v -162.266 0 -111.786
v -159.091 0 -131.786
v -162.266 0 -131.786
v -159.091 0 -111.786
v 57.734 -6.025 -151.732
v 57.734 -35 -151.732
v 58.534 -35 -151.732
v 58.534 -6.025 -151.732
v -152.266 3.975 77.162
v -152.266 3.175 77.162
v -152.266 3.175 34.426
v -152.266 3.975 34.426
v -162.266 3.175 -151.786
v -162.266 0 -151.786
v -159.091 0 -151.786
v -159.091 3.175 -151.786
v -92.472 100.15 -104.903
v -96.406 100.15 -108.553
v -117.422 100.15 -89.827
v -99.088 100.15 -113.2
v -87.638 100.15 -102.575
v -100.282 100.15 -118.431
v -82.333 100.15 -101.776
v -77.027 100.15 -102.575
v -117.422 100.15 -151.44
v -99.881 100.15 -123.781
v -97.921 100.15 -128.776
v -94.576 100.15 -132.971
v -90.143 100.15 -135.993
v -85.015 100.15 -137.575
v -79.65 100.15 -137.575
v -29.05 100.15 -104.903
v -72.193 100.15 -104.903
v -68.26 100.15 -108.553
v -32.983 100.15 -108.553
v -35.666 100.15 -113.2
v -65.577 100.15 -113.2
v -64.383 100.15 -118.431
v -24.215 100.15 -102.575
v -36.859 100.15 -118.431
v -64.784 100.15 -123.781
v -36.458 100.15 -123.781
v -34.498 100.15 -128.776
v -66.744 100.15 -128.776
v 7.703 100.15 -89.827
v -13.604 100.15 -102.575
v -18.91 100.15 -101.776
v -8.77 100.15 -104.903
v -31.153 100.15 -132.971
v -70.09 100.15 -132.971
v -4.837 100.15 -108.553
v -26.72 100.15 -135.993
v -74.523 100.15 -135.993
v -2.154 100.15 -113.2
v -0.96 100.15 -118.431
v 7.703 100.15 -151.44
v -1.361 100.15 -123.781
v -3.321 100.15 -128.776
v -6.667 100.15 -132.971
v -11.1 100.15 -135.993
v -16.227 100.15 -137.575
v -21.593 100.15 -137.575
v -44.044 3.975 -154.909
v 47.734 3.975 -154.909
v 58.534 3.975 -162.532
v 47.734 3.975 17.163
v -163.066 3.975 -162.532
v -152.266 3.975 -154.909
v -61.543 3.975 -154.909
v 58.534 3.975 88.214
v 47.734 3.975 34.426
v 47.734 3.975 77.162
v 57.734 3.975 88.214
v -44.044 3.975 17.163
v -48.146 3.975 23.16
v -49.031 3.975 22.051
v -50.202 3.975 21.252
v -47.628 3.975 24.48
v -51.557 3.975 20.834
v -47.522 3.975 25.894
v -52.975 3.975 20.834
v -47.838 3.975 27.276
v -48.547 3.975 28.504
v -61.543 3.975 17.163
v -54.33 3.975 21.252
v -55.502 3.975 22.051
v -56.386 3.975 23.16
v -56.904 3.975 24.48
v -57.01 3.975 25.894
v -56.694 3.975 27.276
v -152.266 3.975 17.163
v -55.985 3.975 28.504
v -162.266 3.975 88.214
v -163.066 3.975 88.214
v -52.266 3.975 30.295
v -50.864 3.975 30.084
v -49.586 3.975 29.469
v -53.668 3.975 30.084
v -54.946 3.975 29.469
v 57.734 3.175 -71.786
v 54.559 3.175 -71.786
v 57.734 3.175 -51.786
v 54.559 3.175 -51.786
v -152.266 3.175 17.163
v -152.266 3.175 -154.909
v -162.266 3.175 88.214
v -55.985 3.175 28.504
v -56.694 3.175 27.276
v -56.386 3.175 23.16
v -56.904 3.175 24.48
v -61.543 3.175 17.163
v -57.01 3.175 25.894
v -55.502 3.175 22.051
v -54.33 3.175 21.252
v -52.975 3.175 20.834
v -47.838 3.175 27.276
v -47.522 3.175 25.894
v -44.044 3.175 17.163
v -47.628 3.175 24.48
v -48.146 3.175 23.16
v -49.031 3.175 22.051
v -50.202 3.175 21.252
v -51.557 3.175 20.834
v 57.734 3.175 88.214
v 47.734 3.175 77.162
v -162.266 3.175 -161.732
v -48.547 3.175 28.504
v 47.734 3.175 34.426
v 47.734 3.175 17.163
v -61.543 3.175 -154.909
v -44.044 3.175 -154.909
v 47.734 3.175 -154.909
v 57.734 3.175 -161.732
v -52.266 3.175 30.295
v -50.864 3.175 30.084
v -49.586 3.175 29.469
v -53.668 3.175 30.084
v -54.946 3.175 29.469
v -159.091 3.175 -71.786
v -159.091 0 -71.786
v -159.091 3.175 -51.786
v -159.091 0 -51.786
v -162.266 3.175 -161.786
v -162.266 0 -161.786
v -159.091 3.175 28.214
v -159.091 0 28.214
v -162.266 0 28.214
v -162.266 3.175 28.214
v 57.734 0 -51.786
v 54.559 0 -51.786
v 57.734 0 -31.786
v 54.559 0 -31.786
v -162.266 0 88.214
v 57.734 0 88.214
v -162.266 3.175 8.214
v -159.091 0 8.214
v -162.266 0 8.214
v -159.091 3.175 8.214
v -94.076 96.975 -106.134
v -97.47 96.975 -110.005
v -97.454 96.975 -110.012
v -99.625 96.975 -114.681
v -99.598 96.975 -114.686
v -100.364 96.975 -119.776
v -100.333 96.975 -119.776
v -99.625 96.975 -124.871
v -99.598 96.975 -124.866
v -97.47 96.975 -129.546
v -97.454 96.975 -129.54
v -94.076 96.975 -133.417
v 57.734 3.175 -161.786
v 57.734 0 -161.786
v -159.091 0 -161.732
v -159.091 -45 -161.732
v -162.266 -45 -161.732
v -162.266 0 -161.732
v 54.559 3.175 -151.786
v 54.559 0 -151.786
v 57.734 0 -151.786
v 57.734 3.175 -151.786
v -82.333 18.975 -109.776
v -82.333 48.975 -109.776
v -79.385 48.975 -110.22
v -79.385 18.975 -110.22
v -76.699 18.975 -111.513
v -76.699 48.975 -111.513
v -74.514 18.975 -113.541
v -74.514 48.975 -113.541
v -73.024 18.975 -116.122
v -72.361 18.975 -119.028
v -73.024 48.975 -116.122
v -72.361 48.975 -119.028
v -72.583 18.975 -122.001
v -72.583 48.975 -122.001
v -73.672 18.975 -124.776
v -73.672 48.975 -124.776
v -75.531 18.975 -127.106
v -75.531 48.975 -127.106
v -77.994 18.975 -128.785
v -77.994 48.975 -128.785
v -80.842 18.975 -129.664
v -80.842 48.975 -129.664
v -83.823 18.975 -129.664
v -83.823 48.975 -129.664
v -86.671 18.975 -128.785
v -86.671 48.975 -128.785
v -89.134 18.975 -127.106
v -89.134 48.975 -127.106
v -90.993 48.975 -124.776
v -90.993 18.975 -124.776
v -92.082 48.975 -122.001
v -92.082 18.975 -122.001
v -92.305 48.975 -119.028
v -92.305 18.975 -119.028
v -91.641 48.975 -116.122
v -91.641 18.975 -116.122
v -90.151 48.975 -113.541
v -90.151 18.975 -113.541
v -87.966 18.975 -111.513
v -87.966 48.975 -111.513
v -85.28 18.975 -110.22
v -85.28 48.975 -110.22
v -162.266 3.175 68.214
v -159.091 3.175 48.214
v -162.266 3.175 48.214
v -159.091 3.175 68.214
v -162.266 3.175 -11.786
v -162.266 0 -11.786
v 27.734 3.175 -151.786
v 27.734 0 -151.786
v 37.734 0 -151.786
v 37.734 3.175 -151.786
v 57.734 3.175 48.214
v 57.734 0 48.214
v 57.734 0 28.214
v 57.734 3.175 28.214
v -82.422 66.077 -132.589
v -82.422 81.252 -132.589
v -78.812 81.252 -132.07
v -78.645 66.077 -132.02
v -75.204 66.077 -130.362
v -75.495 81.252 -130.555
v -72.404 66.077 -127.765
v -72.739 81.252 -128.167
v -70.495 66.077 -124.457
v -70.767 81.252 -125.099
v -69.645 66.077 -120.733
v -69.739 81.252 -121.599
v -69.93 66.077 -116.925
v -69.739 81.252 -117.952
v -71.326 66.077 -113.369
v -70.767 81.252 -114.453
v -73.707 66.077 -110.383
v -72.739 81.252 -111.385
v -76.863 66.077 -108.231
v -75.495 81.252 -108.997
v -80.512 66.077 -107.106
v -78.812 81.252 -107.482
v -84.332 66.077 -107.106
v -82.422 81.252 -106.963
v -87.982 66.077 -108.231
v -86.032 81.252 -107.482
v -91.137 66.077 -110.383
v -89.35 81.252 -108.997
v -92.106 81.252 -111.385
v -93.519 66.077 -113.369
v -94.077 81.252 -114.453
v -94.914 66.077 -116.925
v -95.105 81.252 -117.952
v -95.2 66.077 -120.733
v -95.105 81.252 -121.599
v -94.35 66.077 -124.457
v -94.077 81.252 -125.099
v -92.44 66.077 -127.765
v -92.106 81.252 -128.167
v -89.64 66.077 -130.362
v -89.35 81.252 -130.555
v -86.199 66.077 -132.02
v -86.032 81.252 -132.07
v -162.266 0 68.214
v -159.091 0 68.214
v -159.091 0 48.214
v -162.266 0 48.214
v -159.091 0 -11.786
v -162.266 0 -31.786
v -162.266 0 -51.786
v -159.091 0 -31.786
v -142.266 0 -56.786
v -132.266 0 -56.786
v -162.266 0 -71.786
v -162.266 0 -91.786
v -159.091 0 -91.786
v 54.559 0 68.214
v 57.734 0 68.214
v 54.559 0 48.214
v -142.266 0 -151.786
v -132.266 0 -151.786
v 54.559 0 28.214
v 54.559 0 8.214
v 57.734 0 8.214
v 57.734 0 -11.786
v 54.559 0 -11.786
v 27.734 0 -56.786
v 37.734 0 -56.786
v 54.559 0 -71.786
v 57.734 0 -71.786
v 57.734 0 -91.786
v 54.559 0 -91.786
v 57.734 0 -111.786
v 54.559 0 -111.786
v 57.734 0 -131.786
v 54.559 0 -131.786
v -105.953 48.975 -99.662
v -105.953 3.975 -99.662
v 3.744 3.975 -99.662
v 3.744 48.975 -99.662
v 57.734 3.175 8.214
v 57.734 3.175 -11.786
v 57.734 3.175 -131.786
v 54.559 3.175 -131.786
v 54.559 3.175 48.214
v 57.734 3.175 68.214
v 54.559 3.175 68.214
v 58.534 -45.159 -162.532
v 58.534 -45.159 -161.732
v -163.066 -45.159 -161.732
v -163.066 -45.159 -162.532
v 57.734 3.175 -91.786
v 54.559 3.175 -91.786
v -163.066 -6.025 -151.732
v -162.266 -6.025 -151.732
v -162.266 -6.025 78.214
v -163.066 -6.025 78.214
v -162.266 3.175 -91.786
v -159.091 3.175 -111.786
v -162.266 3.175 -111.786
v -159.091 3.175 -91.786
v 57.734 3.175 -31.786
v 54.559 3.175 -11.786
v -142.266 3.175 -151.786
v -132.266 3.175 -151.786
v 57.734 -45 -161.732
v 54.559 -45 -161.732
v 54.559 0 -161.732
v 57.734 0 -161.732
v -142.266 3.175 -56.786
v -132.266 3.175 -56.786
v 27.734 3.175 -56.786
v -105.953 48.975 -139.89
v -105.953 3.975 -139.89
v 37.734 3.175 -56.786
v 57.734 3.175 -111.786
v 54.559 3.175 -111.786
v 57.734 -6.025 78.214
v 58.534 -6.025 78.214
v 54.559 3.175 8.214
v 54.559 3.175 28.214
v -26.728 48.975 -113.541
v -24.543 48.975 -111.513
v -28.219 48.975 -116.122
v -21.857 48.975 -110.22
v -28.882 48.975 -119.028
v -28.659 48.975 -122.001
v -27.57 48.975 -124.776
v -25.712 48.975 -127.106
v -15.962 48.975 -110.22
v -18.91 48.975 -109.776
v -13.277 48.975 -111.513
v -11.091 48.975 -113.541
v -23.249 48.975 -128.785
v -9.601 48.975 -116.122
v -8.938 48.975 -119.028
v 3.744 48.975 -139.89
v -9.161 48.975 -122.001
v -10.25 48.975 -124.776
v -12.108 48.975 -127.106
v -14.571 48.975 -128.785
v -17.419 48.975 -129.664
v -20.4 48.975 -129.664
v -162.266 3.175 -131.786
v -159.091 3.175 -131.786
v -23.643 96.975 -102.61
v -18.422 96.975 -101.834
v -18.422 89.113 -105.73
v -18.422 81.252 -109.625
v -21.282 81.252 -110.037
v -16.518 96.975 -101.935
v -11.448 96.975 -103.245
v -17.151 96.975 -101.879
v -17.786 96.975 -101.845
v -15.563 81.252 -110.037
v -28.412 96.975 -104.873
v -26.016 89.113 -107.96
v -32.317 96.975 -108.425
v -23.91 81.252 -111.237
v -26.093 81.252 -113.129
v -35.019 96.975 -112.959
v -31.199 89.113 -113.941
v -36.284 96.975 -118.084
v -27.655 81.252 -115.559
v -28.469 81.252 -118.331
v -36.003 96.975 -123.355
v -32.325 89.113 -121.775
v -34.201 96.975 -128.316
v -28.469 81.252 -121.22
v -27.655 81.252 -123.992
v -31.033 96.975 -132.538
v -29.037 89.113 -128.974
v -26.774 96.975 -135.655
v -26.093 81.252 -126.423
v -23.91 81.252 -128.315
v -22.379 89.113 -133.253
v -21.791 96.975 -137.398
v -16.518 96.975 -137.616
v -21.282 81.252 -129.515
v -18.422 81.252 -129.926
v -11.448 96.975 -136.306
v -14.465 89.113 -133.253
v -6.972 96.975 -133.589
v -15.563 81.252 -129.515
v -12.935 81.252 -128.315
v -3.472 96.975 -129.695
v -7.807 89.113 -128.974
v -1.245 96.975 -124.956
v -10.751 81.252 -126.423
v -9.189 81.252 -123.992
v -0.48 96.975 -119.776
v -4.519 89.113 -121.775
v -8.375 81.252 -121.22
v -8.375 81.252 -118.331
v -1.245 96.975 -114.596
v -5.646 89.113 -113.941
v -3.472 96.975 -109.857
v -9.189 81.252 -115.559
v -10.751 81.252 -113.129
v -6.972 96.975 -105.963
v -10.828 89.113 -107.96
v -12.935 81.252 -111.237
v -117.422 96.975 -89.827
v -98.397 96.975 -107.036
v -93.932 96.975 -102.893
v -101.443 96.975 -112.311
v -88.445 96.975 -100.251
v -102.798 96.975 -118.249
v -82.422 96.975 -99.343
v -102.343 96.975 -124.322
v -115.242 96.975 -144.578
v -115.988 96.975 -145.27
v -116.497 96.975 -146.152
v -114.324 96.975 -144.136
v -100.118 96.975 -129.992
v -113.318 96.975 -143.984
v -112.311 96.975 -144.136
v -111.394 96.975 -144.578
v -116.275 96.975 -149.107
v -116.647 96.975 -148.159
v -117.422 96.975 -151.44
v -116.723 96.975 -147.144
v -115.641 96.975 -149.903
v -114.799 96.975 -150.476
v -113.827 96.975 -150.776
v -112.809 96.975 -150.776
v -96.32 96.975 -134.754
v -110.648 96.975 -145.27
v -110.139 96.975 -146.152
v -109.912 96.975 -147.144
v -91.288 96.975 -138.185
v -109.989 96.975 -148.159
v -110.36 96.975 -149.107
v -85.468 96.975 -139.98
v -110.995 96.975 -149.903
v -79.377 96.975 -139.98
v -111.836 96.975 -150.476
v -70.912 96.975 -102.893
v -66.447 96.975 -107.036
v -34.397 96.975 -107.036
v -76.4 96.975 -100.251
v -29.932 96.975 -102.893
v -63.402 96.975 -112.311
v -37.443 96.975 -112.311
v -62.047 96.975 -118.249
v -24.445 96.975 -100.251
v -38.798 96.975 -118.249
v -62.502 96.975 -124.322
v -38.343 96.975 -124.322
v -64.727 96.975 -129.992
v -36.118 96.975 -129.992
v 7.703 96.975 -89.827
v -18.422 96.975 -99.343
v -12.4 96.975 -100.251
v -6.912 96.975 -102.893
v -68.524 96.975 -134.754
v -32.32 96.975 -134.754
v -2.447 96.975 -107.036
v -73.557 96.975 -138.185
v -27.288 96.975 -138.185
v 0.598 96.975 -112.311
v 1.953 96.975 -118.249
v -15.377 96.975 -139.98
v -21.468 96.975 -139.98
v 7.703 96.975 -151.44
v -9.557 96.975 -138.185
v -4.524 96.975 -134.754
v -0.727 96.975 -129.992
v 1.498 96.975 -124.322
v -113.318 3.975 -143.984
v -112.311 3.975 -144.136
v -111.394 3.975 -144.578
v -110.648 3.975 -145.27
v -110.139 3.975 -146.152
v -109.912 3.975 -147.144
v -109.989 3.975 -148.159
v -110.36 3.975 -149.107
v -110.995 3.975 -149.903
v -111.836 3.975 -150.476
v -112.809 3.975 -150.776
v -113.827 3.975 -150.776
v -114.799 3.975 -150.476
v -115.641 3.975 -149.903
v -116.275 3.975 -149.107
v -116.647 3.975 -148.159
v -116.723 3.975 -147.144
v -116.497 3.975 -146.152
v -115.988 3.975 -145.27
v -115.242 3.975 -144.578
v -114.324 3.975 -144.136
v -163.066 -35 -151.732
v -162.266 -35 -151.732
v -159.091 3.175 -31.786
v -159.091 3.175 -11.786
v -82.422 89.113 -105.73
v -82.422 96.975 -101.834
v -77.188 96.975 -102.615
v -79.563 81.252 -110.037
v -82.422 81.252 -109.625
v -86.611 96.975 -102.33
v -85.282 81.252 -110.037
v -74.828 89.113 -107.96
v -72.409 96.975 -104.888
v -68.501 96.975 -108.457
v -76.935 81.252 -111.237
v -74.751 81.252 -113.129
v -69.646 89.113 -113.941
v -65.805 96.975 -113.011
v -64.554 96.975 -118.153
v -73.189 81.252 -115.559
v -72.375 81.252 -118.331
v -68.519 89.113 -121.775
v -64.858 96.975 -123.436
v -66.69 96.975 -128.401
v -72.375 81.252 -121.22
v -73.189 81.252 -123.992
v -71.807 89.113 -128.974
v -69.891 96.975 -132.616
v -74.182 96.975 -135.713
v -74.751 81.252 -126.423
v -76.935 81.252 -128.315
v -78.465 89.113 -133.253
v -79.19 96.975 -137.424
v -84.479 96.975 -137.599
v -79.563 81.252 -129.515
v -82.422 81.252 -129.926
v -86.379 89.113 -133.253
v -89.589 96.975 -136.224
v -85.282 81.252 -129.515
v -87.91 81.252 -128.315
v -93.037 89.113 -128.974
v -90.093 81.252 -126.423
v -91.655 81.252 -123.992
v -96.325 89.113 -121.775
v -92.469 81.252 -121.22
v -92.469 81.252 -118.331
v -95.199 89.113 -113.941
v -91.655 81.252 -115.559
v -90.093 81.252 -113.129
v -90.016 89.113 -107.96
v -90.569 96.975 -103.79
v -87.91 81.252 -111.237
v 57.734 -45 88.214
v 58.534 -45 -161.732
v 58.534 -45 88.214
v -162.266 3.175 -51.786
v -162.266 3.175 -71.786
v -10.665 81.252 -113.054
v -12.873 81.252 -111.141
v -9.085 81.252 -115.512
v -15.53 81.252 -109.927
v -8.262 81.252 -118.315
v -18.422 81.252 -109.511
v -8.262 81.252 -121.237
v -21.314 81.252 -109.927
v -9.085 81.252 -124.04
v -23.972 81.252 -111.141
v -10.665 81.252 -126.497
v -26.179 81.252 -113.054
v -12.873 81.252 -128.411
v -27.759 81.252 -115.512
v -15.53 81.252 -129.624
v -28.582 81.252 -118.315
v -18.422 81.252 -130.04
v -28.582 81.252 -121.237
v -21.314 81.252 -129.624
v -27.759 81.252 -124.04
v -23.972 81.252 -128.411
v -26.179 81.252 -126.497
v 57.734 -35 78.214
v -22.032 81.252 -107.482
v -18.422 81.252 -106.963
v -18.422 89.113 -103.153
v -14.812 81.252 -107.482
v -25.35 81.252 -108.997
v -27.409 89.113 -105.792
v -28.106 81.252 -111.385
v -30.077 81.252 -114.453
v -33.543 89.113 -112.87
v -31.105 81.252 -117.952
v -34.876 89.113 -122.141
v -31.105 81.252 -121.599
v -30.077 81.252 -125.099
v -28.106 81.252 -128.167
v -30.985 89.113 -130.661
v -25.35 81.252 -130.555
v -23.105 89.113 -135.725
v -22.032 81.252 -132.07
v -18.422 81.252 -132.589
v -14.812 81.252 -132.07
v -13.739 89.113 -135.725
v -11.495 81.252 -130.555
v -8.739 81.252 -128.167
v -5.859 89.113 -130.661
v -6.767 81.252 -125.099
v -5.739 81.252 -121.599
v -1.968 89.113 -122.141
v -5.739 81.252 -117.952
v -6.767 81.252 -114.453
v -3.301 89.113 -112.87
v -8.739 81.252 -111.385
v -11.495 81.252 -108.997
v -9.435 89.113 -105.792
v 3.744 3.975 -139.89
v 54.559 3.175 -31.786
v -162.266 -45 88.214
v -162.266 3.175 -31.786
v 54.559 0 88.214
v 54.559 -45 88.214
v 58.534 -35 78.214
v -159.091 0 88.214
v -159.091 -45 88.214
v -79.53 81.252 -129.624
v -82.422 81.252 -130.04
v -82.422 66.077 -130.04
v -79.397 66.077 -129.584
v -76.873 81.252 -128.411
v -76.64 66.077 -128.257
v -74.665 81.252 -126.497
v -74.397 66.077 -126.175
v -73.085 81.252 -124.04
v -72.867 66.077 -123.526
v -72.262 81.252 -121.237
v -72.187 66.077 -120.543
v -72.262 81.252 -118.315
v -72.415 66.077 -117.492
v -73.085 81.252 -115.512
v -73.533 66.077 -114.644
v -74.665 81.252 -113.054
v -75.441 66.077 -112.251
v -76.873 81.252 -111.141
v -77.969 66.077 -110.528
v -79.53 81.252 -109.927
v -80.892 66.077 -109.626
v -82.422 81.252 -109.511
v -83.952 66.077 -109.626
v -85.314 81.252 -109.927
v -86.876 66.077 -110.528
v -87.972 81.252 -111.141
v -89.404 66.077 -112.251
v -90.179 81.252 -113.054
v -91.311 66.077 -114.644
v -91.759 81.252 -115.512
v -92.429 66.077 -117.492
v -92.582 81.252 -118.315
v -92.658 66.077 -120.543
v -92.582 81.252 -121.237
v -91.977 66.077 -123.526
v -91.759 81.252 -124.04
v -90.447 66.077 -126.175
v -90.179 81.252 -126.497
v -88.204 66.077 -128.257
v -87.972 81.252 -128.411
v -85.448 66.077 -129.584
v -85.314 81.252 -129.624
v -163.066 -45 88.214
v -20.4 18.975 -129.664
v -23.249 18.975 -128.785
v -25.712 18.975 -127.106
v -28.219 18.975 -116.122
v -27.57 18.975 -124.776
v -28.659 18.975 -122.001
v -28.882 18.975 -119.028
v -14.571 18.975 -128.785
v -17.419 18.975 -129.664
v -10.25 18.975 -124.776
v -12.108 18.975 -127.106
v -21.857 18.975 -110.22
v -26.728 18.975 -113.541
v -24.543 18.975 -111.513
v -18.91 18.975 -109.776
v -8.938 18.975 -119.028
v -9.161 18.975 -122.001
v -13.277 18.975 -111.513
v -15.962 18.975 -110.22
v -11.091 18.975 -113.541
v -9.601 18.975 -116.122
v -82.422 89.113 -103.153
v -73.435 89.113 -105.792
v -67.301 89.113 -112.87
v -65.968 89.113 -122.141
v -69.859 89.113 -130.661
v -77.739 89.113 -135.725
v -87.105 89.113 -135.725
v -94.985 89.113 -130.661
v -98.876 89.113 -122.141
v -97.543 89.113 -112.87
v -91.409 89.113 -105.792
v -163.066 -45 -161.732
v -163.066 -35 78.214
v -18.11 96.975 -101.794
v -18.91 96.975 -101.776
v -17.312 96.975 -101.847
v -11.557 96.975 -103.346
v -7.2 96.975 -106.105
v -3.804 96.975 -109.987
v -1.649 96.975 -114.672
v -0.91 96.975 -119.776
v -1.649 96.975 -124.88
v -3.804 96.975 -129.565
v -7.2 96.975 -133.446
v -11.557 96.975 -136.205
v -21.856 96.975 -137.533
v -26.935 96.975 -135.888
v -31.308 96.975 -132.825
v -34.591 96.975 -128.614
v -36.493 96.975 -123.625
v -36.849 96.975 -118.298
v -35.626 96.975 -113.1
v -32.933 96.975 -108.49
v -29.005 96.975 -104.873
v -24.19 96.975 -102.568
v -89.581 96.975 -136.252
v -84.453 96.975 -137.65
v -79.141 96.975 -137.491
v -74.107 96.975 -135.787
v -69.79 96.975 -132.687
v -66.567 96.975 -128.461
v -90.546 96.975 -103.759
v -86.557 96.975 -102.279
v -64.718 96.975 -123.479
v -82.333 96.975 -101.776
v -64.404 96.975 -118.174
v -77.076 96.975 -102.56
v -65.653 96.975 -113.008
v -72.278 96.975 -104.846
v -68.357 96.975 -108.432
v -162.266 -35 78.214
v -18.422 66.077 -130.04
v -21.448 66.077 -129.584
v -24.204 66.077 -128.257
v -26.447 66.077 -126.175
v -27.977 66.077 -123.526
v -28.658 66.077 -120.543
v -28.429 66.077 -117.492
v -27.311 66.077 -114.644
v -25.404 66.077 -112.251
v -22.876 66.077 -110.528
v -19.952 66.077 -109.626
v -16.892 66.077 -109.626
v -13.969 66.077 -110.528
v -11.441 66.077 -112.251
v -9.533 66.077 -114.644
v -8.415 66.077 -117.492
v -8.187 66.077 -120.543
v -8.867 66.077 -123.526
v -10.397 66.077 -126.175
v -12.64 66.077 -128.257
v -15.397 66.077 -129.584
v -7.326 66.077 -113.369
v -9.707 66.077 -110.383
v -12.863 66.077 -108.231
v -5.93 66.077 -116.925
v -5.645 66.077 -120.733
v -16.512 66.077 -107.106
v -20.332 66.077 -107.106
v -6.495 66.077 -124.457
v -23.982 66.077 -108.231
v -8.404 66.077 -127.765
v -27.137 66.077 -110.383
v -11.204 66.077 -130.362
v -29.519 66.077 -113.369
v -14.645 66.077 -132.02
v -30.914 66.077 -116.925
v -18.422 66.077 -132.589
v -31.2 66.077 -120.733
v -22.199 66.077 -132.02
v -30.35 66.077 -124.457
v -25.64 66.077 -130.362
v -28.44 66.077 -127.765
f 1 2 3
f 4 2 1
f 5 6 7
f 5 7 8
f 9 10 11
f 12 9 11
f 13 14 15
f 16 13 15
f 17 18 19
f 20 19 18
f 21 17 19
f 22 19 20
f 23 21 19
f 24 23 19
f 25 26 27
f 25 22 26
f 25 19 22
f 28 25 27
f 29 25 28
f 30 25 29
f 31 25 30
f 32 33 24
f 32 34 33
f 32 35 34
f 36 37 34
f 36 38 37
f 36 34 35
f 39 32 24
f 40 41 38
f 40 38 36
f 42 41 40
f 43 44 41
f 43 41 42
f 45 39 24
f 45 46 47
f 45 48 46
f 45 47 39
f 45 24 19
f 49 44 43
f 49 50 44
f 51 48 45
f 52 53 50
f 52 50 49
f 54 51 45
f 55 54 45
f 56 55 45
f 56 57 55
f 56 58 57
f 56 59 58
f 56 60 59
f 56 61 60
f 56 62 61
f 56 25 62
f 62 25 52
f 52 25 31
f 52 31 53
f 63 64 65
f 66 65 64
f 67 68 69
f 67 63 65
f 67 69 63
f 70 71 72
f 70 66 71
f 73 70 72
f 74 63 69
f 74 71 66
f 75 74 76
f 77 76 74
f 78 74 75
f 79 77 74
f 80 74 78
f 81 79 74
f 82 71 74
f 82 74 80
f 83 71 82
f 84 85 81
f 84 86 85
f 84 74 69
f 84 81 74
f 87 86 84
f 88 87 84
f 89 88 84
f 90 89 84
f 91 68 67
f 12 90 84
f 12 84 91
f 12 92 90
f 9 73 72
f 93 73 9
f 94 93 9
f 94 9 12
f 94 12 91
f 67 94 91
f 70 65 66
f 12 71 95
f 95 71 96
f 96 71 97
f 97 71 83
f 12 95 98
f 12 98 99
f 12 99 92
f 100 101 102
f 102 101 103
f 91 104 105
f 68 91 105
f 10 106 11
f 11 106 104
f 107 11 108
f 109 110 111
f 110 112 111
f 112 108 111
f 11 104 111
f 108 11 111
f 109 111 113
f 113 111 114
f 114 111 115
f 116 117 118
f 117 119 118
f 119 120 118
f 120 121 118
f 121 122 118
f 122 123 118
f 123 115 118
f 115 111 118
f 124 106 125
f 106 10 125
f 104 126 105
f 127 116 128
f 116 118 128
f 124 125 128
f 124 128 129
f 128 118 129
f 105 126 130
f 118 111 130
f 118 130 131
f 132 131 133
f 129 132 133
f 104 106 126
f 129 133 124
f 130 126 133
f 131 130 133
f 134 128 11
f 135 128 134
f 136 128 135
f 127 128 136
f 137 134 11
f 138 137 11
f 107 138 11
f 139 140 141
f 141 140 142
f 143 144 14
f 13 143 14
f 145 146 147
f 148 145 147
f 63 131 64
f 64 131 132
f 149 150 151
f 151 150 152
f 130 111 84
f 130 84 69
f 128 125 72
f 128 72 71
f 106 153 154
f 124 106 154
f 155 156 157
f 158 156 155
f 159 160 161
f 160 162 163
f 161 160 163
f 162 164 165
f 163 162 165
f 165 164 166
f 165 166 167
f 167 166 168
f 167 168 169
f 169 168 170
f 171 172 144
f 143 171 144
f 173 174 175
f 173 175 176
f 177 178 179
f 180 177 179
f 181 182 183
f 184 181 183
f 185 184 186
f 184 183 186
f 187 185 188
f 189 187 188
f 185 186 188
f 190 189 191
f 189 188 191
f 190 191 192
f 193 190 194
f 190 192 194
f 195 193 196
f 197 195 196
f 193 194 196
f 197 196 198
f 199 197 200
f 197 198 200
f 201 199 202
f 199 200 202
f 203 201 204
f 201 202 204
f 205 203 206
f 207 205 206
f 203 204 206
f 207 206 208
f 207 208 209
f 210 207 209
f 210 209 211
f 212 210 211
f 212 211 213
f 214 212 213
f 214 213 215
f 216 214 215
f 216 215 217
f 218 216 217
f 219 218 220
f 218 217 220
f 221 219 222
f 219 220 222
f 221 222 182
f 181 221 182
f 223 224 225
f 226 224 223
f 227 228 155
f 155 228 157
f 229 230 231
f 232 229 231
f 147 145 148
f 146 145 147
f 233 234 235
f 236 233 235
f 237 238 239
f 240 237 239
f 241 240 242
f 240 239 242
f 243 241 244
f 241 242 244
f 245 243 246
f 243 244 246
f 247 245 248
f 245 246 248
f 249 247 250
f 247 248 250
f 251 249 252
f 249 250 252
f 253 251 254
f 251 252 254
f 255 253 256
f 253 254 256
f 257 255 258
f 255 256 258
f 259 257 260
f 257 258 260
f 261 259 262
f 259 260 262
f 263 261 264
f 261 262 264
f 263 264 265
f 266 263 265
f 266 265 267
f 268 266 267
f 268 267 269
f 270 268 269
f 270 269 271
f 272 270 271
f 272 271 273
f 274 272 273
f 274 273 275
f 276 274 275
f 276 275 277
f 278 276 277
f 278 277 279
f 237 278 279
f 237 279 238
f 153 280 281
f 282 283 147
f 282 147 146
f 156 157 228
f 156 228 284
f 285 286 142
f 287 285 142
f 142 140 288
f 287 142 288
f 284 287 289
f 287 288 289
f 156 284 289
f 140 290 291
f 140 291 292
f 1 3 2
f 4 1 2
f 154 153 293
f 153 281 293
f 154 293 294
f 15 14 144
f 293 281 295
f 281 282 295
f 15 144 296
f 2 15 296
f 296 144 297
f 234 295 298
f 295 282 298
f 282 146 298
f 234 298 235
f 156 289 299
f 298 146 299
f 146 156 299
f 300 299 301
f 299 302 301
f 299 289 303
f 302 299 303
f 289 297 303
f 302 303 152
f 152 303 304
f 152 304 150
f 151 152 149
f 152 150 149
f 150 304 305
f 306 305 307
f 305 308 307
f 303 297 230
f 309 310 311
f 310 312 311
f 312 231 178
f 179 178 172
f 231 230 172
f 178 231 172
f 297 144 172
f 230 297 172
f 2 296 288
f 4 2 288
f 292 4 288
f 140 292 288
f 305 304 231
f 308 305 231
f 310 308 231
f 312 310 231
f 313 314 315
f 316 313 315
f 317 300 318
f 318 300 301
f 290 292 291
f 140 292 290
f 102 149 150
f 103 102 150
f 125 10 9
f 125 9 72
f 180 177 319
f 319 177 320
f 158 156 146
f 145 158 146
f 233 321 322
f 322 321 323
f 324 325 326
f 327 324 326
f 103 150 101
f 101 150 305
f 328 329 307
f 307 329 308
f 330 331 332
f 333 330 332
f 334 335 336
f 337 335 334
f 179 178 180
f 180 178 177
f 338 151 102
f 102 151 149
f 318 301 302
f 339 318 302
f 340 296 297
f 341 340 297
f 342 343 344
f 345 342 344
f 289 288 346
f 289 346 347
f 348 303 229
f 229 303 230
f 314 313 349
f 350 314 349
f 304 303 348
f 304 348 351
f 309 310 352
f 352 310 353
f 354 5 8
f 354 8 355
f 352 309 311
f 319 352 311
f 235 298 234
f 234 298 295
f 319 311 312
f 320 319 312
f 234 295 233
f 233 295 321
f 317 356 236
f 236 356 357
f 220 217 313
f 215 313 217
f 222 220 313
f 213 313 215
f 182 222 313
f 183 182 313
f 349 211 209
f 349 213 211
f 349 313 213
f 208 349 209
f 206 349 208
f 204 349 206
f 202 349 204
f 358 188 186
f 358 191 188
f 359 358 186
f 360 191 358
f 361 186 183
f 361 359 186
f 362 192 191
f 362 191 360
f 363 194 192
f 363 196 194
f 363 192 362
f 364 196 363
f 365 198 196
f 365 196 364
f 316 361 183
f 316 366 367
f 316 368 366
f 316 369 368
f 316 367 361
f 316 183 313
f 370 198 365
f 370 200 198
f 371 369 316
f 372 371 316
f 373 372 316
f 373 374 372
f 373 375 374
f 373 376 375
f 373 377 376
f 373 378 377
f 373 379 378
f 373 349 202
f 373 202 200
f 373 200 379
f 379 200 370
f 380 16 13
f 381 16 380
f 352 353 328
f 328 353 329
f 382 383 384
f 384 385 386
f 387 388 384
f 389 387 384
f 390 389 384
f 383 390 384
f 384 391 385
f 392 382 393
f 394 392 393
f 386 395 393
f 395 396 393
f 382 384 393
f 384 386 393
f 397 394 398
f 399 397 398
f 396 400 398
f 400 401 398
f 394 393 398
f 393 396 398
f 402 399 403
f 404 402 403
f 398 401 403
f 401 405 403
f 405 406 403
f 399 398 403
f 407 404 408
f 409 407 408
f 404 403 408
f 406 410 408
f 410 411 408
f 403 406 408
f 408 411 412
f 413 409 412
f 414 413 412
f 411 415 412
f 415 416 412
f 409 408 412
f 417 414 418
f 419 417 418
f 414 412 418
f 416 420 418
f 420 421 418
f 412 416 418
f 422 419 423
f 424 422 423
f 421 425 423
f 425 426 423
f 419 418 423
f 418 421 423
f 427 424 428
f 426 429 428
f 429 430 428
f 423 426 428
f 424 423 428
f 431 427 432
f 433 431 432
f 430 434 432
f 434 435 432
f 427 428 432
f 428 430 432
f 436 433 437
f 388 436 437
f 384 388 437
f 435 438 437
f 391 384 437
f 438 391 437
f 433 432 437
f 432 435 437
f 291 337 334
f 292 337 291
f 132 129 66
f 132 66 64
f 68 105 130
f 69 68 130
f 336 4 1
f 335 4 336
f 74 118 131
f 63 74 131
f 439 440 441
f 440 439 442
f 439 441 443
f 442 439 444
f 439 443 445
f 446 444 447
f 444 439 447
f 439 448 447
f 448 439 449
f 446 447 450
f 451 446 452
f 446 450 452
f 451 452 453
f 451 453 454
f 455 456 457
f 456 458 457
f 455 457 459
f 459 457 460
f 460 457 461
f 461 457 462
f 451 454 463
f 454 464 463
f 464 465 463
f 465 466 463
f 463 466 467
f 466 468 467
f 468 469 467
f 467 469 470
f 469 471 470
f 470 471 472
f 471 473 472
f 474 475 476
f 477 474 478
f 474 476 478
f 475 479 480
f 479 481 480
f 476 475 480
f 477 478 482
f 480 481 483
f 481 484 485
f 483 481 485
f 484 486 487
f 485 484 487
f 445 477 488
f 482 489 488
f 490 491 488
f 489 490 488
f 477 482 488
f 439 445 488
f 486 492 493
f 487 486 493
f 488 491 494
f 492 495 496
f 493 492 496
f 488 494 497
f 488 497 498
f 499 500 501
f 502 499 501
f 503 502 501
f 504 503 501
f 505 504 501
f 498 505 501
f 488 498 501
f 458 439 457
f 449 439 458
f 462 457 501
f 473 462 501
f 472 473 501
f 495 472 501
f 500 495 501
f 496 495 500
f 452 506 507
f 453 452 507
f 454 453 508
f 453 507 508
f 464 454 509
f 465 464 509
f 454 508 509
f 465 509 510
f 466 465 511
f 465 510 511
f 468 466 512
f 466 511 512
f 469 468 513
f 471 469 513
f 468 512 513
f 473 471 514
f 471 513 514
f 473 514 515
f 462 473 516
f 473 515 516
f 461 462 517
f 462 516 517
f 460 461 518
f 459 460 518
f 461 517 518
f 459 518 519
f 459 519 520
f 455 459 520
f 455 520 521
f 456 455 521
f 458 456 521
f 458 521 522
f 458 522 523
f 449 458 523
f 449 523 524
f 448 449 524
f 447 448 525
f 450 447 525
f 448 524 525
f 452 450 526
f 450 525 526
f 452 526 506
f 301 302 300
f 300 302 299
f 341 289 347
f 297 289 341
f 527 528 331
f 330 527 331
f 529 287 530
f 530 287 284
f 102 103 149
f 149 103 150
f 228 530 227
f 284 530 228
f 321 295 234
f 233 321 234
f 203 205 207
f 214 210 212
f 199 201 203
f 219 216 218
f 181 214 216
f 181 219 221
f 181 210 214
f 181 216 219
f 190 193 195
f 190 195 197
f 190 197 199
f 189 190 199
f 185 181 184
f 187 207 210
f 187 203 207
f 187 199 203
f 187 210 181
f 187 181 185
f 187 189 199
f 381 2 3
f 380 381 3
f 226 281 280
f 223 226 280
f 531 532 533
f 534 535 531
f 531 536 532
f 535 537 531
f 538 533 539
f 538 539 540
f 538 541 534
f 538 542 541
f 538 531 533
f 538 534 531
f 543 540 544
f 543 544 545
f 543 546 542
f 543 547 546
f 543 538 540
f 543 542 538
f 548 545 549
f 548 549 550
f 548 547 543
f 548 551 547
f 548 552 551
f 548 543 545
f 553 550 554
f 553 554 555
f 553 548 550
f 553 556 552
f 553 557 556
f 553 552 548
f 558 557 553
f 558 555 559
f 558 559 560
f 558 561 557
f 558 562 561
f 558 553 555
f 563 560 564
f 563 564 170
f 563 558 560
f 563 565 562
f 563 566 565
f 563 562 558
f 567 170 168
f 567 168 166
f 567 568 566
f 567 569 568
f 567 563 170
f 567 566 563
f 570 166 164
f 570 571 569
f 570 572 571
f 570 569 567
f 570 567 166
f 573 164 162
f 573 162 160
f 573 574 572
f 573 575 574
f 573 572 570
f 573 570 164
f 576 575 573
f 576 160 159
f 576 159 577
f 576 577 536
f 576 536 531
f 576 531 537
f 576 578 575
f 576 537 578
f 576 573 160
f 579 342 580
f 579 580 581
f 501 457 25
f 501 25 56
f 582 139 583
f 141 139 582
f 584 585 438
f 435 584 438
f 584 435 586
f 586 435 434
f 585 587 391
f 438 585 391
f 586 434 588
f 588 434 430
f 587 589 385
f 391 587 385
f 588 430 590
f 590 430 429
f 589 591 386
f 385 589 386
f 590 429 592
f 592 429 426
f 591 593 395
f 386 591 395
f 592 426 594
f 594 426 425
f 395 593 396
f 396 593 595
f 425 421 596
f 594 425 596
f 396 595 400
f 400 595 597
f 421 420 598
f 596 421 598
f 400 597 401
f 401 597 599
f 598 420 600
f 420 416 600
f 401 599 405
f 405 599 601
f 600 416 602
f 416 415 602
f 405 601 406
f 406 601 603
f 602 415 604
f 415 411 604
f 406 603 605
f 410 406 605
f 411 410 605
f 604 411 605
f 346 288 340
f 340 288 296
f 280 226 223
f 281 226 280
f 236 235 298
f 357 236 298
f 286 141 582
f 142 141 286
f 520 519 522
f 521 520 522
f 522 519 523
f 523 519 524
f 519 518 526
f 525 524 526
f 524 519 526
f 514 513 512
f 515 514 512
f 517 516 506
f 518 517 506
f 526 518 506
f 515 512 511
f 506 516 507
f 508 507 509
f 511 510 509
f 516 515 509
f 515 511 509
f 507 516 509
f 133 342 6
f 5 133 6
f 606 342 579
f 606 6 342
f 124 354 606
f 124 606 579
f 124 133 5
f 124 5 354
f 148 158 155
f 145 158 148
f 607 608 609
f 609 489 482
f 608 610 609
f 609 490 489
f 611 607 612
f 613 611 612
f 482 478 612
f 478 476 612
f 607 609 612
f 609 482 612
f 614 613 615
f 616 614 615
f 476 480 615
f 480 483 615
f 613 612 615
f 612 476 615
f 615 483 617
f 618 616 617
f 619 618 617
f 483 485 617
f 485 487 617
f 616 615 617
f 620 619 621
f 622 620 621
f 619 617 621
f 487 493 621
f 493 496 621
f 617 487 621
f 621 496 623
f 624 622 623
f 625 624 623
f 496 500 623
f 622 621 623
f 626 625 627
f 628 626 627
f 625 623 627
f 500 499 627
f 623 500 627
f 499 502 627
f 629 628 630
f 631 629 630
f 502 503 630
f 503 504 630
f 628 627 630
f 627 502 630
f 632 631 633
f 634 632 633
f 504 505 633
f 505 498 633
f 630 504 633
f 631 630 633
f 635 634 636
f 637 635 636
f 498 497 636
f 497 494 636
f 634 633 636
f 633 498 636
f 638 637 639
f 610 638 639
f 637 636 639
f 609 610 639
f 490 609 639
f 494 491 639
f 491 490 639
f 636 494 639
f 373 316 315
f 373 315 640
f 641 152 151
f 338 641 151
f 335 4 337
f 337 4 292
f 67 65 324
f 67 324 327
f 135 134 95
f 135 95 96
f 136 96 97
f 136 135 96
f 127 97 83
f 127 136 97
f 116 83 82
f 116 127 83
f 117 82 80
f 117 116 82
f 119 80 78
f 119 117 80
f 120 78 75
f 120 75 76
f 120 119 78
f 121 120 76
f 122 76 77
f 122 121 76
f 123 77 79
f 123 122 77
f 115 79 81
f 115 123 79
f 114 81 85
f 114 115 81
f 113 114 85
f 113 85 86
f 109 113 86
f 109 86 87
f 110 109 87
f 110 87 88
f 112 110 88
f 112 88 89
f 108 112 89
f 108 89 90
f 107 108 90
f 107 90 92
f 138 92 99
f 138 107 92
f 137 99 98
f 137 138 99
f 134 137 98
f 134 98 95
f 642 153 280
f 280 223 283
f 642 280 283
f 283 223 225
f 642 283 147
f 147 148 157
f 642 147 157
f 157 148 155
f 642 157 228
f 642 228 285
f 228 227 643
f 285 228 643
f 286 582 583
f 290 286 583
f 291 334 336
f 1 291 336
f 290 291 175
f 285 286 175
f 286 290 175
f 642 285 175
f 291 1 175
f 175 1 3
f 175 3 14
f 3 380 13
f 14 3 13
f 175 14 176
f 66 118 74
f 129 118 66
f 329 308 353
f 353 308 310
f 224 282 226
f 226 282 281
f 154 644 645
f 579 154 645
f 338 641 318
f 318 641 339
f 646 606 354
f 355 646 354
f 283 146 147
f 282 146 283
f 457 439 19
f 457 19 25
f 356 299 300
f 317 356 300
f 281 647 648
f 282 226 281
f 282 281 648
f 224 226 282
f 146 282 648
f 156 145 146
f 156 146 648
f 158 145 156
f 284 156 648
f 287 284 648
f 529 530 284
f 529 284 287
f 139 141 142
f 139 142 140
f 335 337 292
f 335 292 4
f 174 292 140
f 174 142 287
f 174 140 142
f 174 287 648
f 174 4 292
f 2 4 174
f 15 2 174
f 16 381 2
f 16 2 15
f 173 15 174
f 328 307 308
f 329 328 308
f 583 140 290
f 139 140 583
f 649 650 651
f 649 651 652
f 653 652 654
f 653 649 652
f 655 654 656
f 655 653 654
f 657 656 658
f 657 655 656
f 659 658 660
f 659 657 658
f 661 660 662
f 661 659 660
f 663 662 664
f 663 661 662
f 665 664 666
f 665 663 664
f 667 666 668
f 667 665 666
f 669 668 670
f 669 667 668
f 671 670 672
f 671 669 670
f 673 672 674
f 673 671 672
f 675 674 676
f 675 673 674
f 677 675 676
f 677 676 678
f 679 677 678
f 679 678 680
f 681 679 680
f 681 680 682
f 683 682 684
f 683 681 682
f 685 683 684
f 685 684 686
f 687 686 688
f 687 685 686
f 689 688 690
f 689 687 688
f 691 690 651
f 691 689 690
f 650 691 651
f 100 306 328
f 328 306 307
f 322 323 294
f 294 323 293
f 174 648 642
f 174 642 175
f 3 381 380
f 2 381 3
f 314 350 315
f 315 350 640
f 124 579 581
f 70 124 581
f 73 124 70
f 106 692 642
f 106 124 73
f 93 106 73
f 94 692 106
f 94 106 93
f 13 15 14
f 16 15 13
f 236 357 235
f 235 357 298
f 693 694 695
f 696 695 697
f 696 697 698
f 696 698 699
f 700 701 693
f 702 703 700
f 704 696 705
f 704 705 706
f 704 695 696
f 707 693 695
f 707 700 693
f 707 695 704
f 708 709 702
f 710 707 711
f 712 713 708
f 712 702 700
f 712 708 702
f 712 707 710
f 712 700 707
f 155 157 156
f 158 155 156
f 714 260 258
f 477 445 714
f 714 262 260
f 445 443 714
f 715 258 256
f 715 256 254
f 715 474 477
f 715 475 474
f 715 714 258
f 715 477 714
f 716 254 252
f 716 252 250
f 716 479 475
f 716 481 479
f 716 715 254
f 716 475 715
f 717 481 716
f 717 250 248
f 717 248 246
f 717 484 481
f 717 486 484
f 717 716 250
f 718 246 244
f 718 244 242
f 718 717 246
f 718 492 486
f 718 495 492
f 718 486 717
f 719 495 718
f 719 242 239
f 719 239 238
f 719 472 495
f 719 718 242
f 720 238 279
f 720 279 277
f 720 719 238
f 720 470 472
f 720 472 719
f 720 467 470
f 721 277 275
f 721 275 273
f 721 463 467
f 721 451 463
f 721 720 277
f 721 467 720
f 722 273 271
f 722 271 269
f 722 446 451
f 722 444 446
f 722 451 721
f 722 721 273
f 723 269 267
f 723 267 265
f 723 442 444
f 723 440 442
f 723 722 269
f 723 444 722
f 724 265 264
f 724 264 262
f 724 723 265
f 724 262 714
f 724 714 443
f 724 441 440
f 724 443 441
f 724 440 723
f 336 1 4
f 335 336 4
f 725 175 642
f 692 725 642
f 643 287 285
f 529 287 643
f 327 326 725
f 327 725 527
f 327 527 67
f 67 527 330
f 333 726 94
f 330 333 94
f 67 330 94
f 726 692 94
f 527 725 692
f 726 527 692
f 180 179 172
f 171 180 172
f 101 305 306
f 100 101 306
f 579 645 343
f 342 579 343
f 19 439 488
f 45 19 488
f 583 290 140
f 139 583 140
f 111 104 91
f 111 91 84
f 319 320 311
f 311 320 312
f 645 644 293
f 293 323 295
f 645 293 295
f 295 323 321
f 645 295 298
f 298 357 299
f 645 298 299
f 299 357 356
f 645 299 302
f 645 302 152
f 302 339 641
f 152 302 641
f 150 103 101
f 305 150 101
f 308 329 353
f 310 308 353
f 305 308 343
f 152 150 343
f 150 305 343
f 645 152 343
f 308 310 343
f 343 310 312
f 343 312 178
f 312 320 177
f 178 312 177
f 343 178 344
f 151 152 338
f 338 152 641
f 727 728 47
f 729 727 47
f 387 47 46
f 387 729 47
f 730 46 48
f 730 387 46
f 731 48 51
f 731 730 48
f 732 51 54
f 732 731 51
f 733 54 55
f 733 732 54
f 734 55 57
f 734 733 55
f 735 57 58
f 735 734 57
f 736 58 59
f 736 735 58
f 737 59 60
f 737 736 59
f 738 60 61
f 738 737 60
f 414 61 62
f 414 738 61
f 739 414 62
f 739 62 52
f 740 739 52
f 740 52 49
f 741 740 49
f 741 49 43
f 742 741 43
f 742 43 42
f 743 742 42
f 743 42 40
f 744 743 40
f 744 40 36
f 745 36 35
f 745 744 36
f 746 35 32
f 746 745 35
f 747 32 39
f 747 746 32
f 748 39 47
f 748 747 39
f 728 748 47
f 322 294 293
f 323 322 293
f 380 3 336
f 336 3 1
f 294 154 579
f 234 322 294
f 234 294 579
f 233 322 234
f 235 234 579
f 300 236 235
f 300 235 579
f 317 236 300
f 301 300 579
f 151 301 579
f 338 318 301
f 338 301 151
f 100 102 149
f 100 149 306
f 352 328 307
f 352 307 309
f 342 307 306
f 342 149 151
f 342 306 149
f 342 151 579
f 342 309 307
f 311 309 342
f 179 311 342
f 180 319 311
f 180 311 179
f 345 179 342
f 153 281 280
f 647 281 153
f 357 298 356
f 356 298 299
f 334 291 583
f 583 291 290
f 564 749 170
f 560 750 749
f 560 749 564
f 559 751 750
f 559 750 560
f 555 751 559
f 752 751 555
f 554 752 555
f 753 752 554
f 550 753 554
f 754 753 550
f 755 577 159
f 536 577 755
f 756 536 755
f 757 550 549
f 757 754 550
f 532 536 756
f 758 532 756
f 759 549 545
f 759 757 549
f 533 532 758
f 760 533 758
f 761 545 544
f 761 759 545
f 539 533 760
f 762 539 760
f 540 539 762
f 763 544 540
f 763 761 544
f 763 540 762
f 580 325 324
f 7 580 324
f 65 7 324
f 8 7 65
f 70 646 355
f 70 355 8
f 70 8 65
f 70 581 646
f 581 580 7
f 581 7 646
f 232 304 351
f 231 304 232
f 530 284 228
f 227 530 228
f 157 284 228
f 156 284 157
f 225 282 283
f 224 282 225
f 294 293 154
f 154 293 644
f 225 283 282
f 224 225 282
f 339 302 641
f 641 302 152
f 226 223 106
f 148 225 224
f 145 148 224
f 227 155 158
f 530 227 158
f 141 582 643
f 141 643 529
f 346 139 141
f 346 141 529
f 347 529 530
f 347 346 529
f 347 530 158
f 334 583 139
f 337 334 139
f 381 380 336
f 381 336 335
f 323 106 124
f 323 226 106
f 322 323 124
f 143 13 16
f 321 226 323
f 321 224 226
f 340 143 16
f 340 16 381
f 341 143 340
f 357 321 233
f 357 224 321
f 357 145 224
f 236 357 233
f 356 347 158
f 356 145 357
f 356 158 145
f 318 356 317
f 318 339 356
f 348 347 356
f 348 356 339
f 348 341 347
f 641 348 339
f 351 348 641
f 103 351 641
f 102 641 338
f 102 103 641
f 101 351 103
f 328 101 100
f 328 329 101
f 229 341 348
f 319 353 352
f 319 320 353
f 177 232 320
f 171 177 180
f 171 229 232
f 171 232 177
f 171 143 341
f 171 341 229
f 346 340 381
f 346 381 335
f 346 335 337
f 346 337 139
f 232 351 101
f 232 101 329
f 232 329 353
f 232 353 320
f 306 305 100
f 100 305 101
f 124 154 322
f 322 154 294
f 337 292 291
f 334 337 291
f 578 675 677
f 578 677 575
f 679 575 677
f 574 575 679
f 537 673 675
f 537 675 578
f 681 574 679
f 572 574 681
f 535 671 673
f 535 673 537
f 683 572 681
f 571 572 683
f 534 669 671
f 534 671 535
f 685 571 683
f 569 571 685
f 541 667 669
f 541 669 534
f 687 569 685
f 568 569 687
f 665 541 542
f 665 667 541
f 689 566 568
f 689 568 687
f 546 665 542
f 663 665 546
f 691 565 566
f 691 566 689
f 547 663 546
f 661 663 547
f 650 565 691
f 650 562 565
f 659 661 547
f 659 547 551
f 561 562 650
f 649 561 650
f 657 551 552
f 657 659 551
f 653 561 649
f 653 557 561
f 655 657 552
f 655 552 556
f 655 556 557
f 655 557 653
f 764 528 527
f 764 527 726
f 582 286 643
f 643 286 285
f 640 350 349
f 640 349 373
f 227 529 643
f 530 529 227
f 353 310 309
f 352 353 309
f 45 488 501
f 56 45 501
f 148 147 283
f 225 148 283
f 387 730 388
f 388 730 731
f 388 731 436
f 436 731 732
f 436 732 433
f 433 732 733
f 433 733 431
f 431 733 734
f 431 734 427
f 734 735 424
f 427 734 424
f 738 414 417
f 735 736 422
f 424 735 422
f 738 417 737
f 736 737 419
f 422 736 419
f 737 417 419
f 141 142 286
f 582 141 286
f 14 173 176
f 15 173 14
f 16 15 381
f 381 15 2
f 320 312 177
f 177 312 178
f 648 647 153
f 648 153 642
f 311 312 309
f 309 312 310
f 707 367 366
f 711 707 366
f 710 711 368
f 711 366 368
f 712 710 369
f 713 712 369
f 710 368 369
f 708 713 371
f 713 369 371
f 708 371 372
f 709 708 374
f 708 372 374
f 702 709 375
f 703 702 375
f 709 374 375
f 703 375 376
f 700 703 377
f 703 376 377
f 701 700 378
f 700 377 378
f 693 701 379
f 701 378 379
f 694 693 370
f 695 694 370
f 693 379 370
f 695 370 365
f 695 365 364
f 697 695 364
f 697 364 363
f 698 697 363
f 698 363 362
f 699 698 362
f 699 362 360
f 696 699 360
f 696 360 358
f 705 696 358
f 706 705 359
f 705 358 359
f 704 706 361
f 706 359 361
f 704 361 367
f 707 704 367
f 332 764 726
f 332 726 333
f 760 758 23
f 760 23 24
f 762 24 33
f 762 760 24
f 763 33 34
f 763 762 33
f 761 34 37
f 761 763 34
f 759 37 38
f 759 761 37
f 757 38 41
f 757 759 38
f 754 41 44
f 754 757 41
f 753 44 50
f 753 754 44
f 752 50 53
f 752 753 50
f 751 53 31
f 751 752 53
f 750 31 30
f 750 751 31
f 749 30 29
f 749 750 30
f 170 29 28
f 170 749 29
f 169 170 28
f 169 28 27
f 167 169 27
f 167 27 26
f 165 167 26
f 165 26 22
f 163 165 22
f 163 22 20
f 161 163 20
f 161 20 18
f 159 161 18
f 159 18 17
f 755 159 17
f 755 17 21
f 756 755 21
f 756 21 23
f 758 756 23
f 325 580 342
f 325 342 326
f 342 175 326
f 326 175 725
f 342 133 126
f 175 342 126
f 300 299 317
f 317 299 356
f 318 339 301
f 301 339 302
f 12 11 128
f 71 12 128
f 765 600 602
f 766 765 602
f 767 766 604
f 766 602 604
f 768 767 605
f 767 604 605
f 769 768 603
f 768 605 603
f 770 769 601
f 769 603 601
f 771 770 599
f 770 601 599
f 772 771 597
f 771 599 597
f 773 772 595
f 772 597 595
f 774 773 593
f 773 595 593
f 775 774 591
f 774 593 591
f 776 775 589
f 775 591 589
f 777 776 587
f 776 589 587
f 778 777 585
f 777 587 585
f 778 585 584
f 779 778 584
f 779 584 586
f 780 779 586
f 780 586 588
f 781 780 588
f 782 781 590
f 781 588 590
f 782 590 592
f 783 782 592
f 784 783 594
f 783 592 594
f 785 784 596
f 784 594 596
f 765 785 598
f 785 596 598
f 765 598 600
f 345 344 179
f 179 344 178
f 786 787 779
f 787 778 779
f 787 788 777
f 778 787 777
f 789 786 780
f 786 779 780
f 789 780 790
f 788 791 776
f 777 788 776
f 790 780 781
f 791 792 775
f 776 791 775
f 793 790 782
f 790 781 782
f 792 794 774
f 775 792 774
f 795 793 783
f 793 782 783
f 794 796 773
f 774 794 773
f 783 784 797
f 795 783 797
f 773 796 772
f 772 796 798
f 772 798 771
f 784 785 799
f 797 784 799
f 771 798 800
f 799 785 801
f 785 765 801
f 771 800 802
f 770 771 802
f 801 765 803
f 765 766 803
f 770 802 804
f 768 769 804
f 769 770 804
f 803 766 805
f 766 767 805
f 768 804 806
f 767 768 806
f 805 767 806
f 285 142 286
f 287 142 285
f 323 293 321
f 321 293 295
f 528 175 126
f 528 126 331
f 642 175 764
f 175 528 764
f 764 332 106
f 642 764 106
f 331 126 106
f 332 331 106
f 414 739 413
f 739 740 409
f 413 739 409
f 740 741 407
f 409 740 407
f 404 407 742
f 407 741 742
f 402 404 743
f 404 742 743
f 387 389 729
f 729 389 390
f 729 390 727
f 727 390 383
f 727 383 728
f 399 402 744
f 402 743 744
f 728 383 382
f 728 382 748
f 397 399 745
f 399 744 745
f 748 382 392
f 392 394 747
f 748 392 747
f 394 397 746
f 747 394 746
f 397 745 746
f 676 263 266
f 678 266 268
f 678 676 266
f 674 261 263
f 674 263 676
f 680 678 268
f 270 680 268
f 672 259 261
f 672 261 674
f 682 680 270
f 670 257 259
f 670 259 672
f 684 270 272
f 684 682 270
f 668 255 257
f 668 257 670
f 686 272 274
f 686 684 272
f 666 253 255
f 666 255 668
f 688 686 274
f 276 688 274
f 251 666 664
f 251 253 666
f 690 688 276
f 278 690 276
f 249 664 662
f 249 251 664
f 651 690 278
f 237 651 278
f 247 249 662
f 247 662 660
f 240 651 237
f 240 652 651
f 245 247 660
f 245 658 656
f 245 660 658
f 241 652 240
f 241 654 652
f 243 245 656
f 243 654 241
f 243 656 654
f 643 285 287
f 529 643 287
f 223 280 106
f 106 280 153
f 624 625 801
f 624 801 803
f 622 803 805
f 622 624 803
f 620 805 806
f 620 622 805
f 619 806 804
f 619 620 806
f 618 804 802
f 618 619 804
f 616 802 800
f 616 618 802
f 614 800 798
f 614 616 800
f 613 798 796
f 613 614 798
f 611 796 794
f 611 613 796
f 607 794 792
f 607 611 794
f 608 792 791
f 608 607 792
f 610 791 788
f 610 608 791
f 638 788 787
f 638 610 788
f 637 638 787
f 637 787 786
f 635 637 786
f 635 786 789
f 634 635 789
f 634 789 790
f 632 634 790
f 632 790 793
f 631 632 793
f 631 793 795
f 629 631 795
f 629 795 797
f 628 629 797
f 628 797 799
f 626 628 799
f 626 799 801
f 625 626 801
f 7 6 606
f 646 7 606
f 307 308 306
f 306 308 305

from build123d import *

# Parameters (mm, degrees)
SKETCH2_W            = 10
SKETCH2_H            = 95
BOSS_EXTRUDE1_DEPTH  = 3.175
BOSS_EXTRUDE2_DEPTH  = 3.175
SKETCH6_W            = 220
SKETCH6_H            = 250
SKETCH6_R            = 4.757017435
SKETCH6_W_2          = 200
SKETCH6_H_2          = 42.736820738
SKETCH6_W_3          = 90.723680888
SKETCH6_H_3          = 172.072273937
SKETCH6_W_4          = 91.778190592
BOSS_EXTRUDE5_DEPTH  = 0.8
SKETCH9_W            = 249.946143141
SKETCH9_H            = 48.975
SKETCH9_W_2          = 229.946143141
SKETCH9_H_2          = 28.975
BOSS_EXTRUDE7_DEPTH  = 0.8
SKETCH10_W           = 109.697281068
SKETCH10_H           = 40.228121307
BOSS_EXTRUDE8_DEPTH  = 45
SKETCH11_R           = 10
CUT_EXTRUDE1_DEPTH   = 30
SKETCH12_R           = 3.414901982
BOSS_EXTRUDE9_DEPTH  = 93
SKETCH13_W           = 125.125550564
SKETCH13_H           = 61.612798217
SKETCH13_R           = 18
BOSS_EXTRUDE10_DEPTH = 3.175
SKETCH16_R           = 12.813177074
SKETCH16_R_2         = 10.264351108
BOSS_EXTRUDE11_DEPTH = 15.175
SKETCH17_W           = 221.6
SKETCH17_H           = 49.134485582
BOSS_EXTRUDE12_DEPTH = 0.8


with BuildPart() as part:
    # Sketch2 → Boss-Extrude1 (new body)
    with BuildSketch(Plane(origin=(0, 0, 0), x_dir=(1, 0, 0), z_dir=(0, 1, 0))):
        Polygon((-162.266187111, -88.214102909), (57.733812889, -88.214102909), (57.733812889, -68.214102909), (54.558812889, -68.214102909), (54.558812889, -48.214102909), (57.733812889, -48.214102909), (57.733812889, -28.214102909), (54.558812889, -28.214102909), (54.558812889, -8.214102909), (57.733812889, -8.214102909), (57.733812889, 11.785897091), (54.558812889, 11.785897091), (54.558812889, 31.785897091), (57.733812889, 31.785897091), (57.733812889, 51.785897091), (54.558812889, 51.785897091), (54.558812889, 71.785897091), (57.733812889, 71.785897091), (57.733812889, 91.785897091), (54.558812889, 91.785897091), (54.558812889, 111.785897091), (57.733812889, 111.785897091), (57.733812889, 131.785897091), (54.558812889, 131.785897091), (54.558812889, 151.785897091), (57.733812889, 151.785897091), (57.733812889, 161.785897091), (-162.266187111, 161.785897091), (-162.266187111, 151.785897091), (-159.091187111, 151.785897091), (-159.091187111, 131.785897091), (-162.266187111, 131.785897091), (-162.266187111, 111.785897091), (-159.091187111, 111.785897091), (-159.091187111, 91.785897091), (-162.266187111, 91.785897091), (-162.266187111, 71.785897091), (-159.091187111, 71.785897091), (-159.091187111, 51.785897091), (-162.266187111, 51.785897091), (-162.266187111, 31.785897091), (-159.091187111, 31.785897091), (-159.091187111, 11.785897091), (-162.266187111, 11.785897091), (-162.266187111, -8.214102909), (-159.091187111, -8.214102909), (-159.091187111, -28.214102909), (-162.266187111, -28.214102909), (-162.266187111, -48.214102909), (-159.091187111, -48.214102909), (-159.091187111, -68.214102909), (-162.266187111, -68.214102909), align=None)
        with Locations((32.733812889, 104.285897091)):
            Rectangle(SKETCH2_W, SKETCH2_H, mode=Mode.SUBTRACT)
        with Locations((-137.266187111, 104.285897091)):
            Rectangle(SKETCH2_W, SKETCH2_H, mode=Mode.SUBTRACT)
    extrude(amount=BOSS_EXTRUDE1_DEPTH)


with BuildPart() as body_2:
    # Sketch3 → Boss-Extrude2 (new body)
    with BuildSketch(Plane.ZY.offset(159.091187111)):
        Polygon((68.214102909, 3.175), (68.214102909, 0), (88.214102909, 0), (88.214102909, -45), (-161.732040232, -45), (-161.732040232, 0), (-151.785897091, 0), (-151.785897091, 3.175), (-131.785897091, 3.175), (-131.785897091, 0), (-111.785897091, 0), (-111.785897091, 3.175), (-91.785897091, 3.175), (-91.785897091, 0), (-71.785897091, 0), (-71.785897091, 3.175), (-51.785897091, 3.175), (-51.785897091, 0), (-31.785897091, 0), (-31.785897091, 3.175), (-11.785897091, 3.175), (-11.785897091, 0), (8.214102909, 0), (8.214102909, 3.175), (28.214102909, 3.175), (28.214102909, 0), (48.214102909, 0), (48.214102909, 3.175), align=None)
    extrude(amount=BOSS_EXTRUDE2_DEPTH)


with BuildPart() as body_3:
    # Sketch6 → Boss-Extrude5 (new body)
    with BuildSketch(Plane(origin=(0, 3.175, 0), x_dir=(1, 0, 0), z_dir=(0, 1, 0))):
        with Locations((-52.266187111, 36.785897091)):
            Rectangle(SKETCH6_W, SKETCH6_H)
        with Locations(Location((-52.266187111, -25.538376938, 0), (0, 0, 270))):
            Circle(SKETCH6_R, mode=Mode.SUBTRACT)
        with Locations((-52.266187111, -55.794020292)):
            Rectangle(SKETCH6_W_2, SKETCH6_H_2, mode=Mode.SUBTRACT)
        with Locations((-106.904346667, 68.87270147)):
            Rectangle(SKETCH6_W_3, SKETCH6_H_3, mode=Mode.SUBTRACT)
        with Locations((1.844717593, 68.87270147)):
            Rectangle(SKETCH6_W_4, SKETCH6_H_3, mode=Mode.SUBTRACT)
    extrude(amount=BOSS_EXTRUDE5_DEPTH)

    # Sketch9 → Boss-Extrude7 (add)
    with BuildSketch(Plane.ZY.offset(162.266187111)):
        with Locations((-36.758968661, -20.5125)):
            Rectangle(SKETCH9_W, SKETCH9_H)
        with Locations((-36.758968661, -20.5125)):
            Rectangle(SKETCH9_W_2, SKETCH9_H_2, mode=Mode.SUBTRACT)
    boss_extrude7 = extrude(amount=BOSS_EXTRUDE7_DEPTH)

    # Mirror5: Boss-Extrude7 across plane
    add(boss_extrude7.mirror(Plane.ZY.offset(52.266187111)))

    # Sketch17 → Boss-Extrude12 (add)
    with BuildSketch(Plane(origin=(0, 0, -161.732040232), x_dir=(-1, 0, 0), z_dir=(0, 0, -1))):
        with Locations((52.266187111, -20.592242791)):
            Rectangle(SKETCH17_W, SKETCH17_H)
    extrude(amount=BOSS_EXTRUDE12_DEPTH)


with BuildPart() as body_4:
    # Sketch10 → Boss-Extrude8 (new body)
    with BuildSketch(Plane(origin=(0, 3.975, 0), x_dir=(1, 0, 0), z_dir=(0, 1, 0))):
        with Locations((-51.104751529, 119.775749139)):
            Rectangle(SKETCH10_W, SKETCH10_H)
    extrude(amount=BOSS_EXTRUDE8_DEPTH)

    # Sketch11 → Cut-Extrude1 (cut)
    with BuildSketch(Plane(origin=(0, 48.975, 0), x_dir=(1, 0, 0), z_dir=(0, 1, 0))):
        with Locations(Location((-82.332653929, 119.775749139, 0), (0, 0, 270))):
            Circle(SKETCH11_R)
        with Locations(Location((-18.909790917, 119.775749139, 0), (0, 0, 270))):
            Circle(SKETCH11_R)
    extrude(amount=-CUT_EXTRUDE1_DEPTH, mode=Mode.SUBTRACT)


with BuildPart() as body_5:
    # Sketch12 → Boss-Extrude9 (new body)
    with BuildSketch(Plane(origin=(0, 3.975, 0), x_dir=(1, 0, 0), z_dir=(0, 1, 0))):
        with Locations(Location((-113.317828916, 147.399324115, 0), (0, 0, 270))):
            Circle(SKETCH12_R)
    extrude(amount=BOSS_EXTRUDE9_DEPTH)

    # Sketch13 → Boss-Extrude10 (add)
    with BuildSketch(Plane(origin=(0, 96.975, 0), x_dir=(1, 0, 0), z_dir=(0, 1, 0))):
        with Locations((-54.859424633, 120.633304207)):
            Rectangle(SKETCH13_W, SKETCH13_H)
        with Locations(Location((-82.332653929, 119.775749139, 0), (0, 0, 270))):
            Circle(SKETCH13_R, mode=Mode.SUBTRACT)
        with Locations(Location((-18.909790917, 119.775749139, 0), (0, 0, 270))):
            Circle(SKETCH13_R, mode=Mode.SUBTRACT)
    extrude(amount=BOSS_EXTRUDE10_DEPTH)

    # Sketch14 → Revolve1 (revolve)
    with BuildSketch(Plane(origin=(-82.422199915, 0, 0), x_dir=(0, 0, -1), z_dir=(1, 0, 0))):
        Polygon((101.834041847, 96.975), (109.625498003, 81.251522407), (106.962572065, 81.251522407), (99.342946609, 96.975), align=None)
    revolve1 = revolve(axis=Axis((-82.422199915, 48.975, -119.775749139), (0, 1, 0)))

    # Sketch16 → Boss-Extrude11 (add)
    with BuildSketch(Plane.XZ.offset(-81.251522407)):
        with Locations(Location((-82.422199915, -119.775749139, 0), (0, 0, 270))):
            Circle(SKETCH16_R)
        with Locations(Location((-82.422199915, -119.775749139, 0), (0, 0, 270))):
            Circle(SKETCH16_R_2, mode=Mode.SUBTRACT)
    boss_extrude11 = extrude(amount=BOSS_EXTRUDE11_DEPTH)

    # Mirror2: Revolve1, Boss-Extrude11 across plane
    add(revolve1.mirror(Plane.ZY.offset(50.422199915)))
    add(boss_extrude11.mirror(Plane.ZY.offset(50.422199915)))


with BuildPart() as body_6:
    # Mirror4: mirrored copy
    add(body_2.part.mirror(Plane.ZY.offset(52.266187111)))


solid = Compound([part.part, body_2.part, body_3.part, body_4.part, body_5.part, body_6.part])
